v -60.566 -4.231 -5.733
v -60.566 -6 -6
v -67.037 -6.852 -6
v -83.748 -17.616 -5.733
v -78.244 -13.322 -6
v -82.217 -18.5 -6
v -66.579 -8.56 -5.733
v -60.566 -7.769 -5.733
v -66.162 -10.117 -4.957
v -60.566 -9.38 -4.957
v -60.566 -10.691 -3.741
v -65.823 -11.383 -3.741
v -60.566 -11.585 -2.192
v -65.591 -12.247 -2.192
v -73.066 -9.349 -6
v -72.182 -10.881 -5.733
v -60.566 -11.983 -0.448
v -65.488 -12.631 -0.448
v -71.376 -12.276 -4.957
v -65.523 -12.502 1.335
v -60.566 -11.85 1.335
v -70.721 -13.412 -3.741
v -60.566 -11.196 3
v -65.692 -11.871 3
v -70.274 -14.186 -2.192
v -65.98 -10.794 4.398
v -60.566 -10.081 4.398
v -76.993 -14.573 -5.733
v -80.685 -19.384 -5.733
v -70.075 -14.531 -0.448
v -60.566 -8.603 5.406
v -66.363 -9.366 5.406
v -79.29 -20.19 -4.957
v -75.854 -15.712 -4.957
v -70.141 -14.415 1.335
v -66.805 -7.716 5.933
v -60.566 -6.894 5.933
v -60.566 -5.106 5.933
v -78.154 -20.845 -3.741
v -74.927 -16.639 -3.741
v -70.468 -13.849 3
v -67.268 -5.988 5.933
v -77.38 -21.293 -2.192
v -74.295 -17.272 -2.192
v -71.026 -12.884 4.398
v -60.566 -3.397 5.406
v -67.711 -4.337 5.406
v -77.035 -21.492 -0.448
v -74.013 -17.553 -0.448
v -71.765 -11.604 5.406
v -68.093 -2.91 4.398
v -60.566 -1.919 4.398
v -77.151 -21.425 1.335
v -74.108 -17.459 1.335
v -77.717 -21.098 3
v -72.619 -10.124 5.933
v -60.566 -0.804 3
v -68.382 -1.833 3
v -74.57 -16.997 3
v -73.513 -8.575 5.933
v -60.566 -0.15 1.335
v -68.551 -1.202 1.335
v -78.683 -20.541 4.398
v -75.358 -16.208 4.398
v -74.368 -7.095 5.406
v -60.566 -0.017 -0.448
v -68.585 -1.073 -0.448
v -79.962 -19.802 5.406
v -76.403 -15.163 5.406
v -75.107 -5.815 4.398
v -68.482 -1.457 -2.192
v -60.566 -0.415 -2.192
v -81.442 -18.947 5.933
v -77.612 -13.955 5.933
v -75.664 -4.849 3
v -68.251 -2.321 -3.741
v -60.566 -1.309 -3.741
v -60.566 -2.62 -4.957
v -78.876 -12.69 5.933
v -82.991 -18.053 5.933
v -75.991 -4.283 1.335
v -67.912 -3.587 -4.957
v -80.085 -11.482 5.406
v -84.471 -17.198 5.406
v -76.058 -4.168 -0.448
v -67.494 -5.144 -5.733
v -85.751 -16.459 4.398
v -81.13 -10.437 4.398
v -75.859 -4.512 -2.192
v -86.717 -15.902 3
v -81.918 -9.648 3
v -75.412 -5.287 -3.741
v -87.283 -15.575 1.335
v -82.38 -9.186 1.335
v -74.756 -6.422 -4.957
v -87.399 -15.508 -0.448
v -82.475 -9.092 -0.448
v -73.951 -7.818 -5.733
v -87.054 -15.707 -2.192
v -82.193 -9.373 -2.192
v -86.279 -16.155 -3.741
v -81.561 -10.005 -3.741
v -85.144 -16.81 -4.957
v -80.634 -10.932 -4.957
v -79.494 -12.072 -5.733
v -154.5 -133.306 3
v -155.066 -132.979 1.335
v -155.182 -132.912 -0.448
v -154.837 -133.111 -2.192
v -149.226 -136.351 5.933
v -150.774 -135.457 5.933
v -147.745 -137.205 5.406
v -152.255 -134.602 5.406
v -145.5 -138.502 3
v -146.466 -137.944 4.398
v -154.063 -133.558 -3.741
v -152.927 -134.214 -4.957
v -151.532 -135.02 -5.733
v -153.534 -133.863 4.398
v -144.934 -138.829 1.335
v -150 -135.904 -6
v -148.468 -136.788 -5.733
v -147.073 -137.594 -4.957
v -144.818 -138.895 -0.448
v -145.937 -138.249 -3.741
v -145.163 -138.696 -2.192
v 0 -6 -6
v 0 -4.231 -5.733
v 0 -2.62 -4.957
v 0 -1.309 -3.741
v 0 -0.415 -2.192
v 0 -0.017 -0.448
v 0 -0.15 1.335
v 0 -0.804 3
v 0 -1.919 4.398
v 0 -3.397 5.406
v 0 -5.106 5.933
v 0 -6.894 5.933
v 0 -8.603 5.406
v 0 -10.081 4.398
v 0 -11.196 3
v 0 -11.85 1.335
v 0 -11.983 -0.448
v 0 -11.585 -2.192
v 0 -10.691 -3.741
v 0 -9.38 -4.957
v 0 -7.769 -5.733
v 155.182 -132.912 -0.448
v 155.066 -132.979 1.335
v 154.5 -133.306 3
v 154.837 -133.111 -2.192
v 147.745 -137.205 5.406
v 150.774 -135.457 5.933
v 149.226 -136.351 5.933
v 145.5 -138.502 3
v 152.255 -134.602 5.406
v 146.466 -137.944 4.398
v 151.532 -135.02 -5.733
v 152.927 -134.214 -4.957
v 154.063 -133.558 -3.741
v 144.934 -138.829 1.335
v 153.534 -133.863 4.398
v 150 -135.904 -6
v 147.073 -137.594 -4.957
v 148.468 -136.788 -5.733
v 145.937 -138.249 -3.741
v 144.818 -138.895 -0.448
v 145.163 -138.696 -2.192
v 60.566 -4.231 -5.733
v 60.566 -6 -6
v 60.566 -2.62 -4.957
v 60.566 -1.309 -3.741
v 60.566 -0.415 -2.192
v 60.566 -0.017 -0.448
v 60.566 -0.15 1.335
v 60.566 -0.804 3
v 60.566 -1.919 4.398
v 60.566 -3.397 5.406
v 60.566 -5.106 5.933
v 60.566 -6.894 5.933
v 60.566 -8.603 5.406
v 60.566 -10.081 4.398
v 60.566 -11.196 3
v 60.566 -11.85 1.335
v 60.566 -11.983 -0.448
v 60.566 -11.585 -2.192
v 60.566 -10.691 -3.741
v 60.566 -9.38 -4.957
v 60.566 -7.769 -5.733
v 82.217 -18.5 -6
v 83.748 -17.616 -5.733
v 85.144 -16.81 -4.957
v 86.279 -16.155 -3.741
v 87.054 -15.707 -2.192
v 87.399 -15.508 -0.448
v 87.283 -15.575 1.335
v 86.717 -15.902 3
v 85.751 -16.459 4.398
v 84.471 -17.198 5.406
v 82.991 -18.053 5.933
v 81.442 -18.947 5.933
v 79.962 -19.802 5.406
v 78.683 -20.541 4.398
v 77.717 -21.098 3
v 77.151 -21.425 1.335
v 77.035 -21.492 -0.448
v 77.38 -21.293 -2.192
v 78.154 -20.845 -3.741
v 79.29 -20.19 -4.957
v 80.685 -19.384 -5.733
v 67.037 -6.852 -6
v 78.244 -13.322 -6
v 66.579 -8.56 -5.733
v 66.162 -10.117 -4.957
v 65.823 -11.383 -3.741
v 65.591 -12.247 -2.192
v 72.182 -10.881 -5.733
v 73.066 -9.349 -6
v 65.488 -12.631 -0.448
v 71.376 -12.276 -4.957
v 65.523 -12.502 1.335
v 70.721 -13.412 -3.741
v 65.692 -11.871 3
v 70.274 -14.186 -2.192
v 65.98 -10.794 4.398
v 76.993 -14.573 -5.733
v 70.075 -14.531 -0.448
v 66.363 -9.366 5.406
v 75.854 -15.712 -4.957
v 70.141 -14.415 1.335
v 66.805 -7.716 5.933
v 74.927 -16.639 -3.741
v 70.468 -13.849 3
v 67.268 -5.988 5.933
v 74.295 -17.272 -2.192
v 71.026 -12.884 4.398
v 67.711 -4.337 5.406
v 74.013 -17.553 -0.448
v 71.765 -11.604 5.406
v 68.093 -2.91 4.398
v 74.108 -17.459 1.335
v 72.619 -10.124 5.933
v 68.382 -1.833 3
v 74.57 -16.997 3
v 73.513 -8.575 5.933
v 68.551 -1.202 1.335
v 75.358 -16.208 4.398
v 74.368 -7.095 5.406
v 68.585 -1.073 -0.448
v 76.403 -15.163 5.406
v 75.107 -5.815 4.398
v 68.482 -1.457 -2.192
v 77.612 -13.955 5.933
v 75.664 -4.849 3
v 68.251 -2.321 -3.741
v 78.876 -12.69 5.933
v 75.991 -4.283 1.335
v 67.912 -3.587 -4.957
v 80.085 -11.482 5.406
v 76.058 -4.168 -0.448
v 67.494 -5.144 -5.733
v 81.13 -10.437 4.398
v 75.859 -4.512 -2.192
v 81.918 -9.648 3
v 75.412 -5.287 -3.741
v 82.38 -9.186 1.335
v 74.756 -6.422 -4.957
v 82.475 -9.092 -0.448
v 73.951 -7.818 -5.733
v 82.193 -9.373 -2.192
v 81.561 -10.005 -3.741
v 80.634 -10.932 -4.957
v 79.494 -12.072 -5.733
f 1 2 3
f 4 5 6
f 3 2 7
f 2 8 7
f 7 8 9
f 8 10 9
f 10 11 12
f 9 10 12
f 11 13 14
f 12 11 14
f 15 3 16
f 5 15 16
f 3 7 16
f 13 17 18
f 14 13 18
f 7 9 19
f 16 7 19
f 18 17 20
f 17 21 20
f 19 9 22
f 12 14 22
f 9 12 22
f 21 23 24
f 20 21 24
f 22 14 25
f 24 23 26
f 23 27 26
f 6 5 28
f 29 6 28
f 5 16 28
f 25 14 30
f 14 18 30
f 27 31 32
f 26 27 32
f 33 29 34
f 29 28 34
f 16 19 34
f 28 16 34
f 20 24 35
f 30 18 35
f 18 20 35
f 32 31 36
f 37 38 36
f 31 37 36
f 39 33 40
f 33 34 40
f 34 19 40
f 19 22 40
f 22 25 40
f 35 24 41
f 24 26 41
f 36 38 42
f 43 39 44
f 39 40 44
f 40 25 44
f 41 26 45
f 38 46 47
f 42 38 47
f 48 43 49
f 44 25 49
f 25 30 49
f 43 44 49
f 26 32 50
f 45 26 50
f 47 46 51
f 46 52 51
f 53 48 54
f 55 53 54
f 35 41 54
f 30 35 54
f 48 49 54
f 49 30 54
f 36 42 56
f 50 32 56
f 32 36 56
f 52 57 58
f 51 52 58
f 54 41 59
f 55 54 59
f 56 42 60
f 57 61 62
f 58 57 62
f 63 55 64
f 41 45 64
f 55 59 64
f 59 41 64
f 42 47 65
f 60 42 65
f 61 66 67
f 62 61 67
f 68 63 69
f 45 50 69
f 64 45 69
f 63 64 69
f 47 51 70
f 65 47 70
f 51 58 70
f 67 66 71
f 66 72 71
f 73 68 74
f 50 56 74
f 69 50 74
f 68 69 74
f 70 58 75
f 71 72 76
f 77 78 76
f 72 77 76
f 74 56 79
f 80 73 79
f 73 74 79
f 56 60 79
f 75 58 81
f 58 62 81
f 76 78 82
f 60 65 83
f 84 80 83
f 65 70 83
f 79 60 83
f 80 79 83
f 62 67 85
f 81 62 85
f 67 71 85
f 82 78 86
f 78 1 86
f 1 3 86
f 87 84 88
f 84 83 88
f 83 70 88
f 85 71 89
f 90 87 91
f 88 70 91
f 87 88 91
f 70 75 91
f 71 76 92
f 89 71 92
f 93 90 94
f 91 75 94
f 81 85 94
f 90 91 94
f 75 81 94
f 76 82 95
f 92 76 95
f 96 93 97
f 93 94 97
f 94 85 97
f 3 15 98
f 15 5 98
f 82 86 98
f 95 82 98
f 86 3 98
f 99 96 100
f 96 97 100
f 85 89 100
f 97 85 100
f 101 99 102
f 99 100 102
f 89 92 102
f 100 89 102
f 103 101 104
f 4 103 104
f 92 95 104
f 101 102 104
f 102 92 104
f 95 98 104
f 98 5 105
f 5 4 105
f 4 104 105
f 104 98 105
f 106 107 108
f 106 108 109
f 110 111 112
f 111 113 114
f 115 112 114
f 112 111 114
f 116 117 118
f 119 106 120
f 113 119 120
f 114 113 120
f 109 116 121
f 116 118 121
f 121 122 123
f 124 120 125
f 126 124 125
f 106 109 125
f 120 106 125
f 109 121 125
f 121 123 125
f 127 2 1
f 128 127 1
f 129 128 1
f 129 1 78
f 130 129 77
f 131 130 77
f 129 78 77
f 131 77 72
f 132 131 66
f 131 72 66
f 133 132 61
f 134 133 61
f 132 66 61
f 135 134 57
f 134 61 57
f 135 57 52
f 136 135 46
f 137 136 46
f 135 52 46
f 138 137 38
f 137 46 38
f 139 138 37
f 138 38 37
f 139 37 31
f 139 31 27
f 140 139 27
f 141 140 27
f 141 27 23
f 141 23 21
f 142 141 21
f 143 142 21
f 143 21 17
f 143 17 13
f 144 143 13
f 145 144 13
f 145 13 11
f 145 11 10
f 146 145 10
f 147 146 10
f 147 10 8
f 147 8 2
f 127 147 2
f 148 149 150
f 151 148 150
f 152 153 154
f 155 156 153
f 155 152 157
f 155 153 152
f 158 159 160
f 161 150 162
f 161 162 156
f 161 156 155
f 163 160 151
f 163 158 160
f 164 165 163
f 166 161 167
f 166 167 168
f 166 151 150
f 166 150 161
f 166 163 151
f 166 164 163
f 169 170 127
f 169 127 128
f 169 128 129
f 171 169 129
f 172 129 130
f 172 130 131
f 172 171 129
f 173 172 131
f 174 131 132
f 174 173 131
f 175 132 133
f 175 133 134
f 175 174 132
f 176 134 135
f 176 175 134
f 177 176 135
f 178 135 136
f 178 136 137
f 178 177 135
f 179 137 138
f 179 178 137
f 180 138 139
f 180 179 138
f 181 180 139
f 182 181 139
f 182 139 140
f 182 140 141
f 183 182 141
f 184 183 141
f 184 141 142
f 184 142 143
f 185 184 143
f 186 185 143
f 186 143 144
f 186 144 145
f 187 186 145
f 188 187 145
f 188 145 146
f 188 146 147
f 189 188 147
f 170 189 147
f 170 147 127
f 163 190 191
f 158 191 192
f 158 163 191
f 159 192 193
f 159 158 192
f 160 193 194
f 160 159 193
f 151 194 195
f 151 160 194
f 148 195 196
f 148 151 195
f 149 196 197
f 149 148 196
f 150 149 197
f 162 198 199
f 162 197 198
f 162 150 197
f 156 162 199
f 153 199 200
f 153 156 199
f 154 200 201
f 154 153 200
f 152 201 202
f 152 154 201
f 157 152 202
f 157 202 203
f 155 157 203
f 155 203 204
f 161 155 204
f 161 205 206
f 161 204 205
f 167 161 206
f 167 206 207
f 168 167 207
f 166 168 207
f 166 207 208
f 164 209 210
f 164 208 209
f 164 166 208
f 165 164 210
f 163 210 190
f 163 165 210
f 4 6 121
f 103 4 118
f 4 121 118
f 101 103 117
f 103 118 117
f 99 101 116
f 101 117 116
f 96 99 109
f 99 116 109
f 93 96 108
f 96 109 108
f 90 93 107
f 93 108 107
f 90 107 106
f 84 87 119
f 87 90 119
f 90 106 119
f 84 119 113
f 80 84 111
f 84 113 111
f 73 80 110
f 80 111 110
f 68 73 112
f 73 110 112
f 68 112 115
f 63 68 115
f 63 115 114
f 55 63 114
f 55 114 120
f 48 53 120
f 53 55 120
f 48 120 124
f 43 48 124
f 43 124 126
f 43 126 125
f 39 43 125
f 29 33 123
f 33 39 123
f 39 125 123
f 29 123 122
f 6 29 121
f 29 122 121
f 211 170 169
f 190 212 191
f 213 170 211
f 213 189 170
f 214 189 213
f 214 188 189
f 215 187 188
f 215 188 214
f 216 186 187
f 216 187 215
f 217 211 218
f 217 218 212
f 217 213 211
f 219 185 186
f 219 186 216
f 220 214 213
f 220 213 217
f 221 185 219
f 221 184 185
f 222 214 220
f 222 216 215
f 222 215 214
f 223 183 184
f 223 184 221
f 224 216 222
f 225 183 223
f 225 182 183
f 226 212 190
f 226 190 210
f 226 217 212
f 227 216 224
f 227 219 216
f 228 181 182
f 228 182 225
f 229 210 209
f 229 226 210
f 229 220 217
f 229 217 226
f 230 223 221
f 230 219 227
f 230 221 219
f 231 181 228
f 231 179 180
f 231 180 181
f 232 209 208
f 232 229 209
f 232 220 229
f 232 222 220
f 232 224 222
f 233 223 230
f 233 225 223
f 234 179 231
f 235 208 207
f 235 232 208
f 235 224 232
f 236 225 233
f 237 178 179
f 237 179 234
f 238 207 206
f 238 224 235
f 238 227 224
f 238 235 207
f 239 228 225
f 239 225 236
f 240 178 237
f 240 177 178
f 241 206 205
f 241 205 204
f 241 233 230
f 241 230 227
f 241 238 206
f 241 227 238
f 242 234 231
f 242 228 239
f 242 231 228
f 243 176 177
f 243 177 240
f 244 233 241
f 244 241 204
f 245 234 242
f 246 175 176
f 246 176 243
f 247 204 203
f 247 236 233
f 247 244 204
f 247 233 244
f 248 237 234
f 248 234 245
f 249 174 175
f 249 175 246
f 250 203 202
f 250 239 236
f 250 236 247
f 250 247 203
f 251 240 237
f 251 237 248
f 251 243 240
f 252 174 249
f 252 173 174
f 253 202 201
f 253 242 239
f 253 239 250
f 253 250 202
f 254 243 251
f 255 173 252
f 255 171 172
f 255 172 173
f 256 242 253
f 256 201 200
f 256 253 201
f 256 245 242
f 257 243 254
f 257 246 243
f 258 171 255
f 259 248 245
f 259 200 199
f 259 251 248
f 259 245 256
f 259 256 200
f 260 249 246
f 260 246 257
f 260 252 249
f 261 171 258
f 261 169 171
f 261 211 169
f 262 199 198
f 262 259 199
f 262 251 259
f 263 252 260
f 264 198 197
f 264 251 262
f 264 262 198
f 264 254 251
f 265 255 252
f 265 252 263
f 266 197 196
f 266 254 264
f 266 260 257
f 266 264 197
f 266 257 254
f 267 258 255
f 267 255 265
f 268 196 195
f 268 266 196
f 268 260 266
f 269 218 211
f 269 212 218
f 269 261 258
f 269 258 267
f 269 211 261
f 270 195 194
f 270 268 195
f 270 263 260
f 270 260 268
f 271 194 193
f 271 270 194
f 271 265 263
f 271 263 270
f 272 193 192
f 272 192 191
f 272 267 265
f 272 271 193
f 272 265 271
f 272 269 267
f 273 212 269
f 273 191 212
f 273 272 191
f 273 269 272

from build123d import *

# Parameters (mm, degrees)
SKETCH_1_R = 6


with BuildPart() as part:
    # По траектории1: sweep along a path in Эскиз2
    with BuildLine(Plane.XY) as sweep_1_path:
        Line((0, -6), (60.56624327, -6))
        ThreePointArc((60.56624327, -6), (73.06624327, -9.349364905), (82.216878365, -18.5))
        Line((82.216878365, -18.5), (150, -135.903810568))
    # Эскиз1 → По траектории1 (sweep)
    with BuildSketch(Plane(origin=(0, 0, 0), x_dir=(0, 0, -1), z_dir=(1, 0, 0))):
        with Locations((0, -6)):
            Circle(SKETCH_1_R)
    sweep_1 = sweep(path=sweep_1_path.line)

    # Зеркальное отражение1: По траектории1 across plane
    add(sweep_1.mirror(Plane(origin=(0, -6, 0), x_dir=(0, 0, 1), z_dir=(1, 0, 0))))


solid = part.part
